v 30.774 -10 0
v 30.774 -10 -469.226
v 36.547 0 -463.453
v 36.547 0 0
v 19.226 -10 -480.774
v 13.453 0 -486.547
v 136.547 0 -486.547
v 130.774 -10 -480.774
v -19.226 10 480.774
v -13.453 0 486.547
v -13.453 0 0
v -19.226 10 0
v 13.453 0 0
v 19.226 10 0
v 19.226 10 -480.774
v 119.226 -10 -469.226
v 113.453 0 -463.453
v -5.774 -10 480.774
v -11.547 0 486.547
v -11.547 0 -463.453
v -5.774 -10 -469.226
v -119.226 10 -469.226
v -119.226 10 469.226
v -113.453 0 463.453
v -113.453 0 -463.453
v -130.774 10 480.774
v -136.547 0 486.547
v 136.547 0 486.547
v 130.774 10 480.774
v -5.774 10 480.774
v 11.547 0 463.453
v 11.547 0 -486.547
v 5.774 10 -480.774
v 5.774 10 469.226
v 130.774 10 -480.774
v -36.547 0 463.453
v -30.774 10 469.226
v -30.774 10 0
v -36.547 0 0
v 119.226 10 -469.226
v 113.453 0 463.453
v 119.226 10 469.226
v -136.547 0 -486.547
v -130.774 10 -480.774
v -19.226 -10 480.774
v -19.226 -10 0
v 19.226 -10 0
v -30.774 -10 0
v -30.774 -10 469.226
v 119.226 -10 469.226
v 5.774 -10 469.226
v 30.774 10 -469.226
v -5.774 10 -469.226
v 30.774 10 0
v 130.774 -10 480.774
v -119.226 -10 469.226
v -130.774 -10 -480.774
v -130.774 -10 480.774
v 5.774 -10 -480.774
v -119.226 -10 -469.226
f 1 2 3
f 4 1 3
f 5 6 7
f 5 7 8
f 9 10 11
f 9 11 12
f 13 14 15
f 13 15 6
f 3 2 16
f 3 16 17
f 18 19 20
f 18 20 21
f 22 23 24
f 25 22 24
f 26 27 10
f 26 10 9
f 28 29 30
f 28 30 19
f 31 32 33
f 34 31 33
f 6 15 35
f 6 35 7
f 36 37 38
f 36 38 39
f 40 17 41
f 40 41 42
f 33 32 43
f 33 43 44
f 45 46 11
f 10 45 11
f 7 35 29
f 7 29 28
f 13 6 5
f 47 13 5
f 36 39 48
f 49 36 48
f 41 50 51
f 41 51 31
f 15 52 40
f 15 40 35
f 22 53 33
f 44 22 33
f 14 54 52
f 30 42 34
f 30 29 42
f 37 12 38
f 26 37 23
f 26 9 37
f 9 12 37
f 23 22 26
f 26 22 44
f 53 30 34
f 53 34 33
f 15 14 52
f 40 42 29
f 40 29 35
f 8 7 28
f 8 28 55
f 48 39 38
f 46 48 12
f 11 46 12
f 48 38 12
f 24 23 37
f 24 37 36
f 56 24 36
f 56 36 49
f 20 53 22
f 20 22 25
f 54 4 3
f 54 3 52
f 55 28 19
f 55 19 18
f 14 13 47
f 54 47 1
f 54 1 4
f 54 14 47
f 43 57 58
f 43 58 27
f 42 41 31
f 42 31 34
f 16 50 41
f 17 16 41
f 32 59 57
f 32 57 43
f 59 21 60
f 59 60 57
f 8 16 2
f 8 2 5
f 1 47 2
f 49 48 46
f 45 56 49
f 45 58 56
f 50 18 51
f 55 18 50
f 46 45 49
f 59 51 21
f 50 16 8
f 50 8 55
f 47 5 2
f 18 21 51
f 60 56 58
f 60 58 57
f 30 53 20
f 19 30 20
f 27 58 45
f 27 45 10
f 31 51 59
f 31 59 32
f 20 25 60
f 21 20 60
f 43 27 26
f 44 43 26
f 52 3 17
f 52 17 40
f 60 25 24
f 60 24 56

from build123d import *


with BuildPart() as part:
    # Sweep2: sweep along a path in Sketch2
    with BuildLine(Plane(origin=(0, 0, 0), x_dir=(1, 0, 0), z_dir=(0, 1, 0))) as sweep2_path:
        Line((-25, 0), (-25, -475))
        Line((-25, -475), (-125, -475))
        Line((-125, -475), (-125, 475))
        Line((-125, 475), (0, 475))
        Line((0, 475), (0, -475))
        Line((0, -475), (125, -475))
        Line((125, -475), (125, 475))
        Line((125, 475), (25, 475))
        Line((25, 475), (25, 0))
    # Sketch3 → Sweep2 (sweep)
    with BuildSketch(Plane.XY):
        Polygon((36.547005384, 0), (30.773502692, 10), (19.226497308, 10), (13.452994616, 0), (19.226497308, -10), (30.773502692, -10), align=None)
    sweep(path=sweep2_path.line, transition=Transition.RIGHT)


solid = part.part
